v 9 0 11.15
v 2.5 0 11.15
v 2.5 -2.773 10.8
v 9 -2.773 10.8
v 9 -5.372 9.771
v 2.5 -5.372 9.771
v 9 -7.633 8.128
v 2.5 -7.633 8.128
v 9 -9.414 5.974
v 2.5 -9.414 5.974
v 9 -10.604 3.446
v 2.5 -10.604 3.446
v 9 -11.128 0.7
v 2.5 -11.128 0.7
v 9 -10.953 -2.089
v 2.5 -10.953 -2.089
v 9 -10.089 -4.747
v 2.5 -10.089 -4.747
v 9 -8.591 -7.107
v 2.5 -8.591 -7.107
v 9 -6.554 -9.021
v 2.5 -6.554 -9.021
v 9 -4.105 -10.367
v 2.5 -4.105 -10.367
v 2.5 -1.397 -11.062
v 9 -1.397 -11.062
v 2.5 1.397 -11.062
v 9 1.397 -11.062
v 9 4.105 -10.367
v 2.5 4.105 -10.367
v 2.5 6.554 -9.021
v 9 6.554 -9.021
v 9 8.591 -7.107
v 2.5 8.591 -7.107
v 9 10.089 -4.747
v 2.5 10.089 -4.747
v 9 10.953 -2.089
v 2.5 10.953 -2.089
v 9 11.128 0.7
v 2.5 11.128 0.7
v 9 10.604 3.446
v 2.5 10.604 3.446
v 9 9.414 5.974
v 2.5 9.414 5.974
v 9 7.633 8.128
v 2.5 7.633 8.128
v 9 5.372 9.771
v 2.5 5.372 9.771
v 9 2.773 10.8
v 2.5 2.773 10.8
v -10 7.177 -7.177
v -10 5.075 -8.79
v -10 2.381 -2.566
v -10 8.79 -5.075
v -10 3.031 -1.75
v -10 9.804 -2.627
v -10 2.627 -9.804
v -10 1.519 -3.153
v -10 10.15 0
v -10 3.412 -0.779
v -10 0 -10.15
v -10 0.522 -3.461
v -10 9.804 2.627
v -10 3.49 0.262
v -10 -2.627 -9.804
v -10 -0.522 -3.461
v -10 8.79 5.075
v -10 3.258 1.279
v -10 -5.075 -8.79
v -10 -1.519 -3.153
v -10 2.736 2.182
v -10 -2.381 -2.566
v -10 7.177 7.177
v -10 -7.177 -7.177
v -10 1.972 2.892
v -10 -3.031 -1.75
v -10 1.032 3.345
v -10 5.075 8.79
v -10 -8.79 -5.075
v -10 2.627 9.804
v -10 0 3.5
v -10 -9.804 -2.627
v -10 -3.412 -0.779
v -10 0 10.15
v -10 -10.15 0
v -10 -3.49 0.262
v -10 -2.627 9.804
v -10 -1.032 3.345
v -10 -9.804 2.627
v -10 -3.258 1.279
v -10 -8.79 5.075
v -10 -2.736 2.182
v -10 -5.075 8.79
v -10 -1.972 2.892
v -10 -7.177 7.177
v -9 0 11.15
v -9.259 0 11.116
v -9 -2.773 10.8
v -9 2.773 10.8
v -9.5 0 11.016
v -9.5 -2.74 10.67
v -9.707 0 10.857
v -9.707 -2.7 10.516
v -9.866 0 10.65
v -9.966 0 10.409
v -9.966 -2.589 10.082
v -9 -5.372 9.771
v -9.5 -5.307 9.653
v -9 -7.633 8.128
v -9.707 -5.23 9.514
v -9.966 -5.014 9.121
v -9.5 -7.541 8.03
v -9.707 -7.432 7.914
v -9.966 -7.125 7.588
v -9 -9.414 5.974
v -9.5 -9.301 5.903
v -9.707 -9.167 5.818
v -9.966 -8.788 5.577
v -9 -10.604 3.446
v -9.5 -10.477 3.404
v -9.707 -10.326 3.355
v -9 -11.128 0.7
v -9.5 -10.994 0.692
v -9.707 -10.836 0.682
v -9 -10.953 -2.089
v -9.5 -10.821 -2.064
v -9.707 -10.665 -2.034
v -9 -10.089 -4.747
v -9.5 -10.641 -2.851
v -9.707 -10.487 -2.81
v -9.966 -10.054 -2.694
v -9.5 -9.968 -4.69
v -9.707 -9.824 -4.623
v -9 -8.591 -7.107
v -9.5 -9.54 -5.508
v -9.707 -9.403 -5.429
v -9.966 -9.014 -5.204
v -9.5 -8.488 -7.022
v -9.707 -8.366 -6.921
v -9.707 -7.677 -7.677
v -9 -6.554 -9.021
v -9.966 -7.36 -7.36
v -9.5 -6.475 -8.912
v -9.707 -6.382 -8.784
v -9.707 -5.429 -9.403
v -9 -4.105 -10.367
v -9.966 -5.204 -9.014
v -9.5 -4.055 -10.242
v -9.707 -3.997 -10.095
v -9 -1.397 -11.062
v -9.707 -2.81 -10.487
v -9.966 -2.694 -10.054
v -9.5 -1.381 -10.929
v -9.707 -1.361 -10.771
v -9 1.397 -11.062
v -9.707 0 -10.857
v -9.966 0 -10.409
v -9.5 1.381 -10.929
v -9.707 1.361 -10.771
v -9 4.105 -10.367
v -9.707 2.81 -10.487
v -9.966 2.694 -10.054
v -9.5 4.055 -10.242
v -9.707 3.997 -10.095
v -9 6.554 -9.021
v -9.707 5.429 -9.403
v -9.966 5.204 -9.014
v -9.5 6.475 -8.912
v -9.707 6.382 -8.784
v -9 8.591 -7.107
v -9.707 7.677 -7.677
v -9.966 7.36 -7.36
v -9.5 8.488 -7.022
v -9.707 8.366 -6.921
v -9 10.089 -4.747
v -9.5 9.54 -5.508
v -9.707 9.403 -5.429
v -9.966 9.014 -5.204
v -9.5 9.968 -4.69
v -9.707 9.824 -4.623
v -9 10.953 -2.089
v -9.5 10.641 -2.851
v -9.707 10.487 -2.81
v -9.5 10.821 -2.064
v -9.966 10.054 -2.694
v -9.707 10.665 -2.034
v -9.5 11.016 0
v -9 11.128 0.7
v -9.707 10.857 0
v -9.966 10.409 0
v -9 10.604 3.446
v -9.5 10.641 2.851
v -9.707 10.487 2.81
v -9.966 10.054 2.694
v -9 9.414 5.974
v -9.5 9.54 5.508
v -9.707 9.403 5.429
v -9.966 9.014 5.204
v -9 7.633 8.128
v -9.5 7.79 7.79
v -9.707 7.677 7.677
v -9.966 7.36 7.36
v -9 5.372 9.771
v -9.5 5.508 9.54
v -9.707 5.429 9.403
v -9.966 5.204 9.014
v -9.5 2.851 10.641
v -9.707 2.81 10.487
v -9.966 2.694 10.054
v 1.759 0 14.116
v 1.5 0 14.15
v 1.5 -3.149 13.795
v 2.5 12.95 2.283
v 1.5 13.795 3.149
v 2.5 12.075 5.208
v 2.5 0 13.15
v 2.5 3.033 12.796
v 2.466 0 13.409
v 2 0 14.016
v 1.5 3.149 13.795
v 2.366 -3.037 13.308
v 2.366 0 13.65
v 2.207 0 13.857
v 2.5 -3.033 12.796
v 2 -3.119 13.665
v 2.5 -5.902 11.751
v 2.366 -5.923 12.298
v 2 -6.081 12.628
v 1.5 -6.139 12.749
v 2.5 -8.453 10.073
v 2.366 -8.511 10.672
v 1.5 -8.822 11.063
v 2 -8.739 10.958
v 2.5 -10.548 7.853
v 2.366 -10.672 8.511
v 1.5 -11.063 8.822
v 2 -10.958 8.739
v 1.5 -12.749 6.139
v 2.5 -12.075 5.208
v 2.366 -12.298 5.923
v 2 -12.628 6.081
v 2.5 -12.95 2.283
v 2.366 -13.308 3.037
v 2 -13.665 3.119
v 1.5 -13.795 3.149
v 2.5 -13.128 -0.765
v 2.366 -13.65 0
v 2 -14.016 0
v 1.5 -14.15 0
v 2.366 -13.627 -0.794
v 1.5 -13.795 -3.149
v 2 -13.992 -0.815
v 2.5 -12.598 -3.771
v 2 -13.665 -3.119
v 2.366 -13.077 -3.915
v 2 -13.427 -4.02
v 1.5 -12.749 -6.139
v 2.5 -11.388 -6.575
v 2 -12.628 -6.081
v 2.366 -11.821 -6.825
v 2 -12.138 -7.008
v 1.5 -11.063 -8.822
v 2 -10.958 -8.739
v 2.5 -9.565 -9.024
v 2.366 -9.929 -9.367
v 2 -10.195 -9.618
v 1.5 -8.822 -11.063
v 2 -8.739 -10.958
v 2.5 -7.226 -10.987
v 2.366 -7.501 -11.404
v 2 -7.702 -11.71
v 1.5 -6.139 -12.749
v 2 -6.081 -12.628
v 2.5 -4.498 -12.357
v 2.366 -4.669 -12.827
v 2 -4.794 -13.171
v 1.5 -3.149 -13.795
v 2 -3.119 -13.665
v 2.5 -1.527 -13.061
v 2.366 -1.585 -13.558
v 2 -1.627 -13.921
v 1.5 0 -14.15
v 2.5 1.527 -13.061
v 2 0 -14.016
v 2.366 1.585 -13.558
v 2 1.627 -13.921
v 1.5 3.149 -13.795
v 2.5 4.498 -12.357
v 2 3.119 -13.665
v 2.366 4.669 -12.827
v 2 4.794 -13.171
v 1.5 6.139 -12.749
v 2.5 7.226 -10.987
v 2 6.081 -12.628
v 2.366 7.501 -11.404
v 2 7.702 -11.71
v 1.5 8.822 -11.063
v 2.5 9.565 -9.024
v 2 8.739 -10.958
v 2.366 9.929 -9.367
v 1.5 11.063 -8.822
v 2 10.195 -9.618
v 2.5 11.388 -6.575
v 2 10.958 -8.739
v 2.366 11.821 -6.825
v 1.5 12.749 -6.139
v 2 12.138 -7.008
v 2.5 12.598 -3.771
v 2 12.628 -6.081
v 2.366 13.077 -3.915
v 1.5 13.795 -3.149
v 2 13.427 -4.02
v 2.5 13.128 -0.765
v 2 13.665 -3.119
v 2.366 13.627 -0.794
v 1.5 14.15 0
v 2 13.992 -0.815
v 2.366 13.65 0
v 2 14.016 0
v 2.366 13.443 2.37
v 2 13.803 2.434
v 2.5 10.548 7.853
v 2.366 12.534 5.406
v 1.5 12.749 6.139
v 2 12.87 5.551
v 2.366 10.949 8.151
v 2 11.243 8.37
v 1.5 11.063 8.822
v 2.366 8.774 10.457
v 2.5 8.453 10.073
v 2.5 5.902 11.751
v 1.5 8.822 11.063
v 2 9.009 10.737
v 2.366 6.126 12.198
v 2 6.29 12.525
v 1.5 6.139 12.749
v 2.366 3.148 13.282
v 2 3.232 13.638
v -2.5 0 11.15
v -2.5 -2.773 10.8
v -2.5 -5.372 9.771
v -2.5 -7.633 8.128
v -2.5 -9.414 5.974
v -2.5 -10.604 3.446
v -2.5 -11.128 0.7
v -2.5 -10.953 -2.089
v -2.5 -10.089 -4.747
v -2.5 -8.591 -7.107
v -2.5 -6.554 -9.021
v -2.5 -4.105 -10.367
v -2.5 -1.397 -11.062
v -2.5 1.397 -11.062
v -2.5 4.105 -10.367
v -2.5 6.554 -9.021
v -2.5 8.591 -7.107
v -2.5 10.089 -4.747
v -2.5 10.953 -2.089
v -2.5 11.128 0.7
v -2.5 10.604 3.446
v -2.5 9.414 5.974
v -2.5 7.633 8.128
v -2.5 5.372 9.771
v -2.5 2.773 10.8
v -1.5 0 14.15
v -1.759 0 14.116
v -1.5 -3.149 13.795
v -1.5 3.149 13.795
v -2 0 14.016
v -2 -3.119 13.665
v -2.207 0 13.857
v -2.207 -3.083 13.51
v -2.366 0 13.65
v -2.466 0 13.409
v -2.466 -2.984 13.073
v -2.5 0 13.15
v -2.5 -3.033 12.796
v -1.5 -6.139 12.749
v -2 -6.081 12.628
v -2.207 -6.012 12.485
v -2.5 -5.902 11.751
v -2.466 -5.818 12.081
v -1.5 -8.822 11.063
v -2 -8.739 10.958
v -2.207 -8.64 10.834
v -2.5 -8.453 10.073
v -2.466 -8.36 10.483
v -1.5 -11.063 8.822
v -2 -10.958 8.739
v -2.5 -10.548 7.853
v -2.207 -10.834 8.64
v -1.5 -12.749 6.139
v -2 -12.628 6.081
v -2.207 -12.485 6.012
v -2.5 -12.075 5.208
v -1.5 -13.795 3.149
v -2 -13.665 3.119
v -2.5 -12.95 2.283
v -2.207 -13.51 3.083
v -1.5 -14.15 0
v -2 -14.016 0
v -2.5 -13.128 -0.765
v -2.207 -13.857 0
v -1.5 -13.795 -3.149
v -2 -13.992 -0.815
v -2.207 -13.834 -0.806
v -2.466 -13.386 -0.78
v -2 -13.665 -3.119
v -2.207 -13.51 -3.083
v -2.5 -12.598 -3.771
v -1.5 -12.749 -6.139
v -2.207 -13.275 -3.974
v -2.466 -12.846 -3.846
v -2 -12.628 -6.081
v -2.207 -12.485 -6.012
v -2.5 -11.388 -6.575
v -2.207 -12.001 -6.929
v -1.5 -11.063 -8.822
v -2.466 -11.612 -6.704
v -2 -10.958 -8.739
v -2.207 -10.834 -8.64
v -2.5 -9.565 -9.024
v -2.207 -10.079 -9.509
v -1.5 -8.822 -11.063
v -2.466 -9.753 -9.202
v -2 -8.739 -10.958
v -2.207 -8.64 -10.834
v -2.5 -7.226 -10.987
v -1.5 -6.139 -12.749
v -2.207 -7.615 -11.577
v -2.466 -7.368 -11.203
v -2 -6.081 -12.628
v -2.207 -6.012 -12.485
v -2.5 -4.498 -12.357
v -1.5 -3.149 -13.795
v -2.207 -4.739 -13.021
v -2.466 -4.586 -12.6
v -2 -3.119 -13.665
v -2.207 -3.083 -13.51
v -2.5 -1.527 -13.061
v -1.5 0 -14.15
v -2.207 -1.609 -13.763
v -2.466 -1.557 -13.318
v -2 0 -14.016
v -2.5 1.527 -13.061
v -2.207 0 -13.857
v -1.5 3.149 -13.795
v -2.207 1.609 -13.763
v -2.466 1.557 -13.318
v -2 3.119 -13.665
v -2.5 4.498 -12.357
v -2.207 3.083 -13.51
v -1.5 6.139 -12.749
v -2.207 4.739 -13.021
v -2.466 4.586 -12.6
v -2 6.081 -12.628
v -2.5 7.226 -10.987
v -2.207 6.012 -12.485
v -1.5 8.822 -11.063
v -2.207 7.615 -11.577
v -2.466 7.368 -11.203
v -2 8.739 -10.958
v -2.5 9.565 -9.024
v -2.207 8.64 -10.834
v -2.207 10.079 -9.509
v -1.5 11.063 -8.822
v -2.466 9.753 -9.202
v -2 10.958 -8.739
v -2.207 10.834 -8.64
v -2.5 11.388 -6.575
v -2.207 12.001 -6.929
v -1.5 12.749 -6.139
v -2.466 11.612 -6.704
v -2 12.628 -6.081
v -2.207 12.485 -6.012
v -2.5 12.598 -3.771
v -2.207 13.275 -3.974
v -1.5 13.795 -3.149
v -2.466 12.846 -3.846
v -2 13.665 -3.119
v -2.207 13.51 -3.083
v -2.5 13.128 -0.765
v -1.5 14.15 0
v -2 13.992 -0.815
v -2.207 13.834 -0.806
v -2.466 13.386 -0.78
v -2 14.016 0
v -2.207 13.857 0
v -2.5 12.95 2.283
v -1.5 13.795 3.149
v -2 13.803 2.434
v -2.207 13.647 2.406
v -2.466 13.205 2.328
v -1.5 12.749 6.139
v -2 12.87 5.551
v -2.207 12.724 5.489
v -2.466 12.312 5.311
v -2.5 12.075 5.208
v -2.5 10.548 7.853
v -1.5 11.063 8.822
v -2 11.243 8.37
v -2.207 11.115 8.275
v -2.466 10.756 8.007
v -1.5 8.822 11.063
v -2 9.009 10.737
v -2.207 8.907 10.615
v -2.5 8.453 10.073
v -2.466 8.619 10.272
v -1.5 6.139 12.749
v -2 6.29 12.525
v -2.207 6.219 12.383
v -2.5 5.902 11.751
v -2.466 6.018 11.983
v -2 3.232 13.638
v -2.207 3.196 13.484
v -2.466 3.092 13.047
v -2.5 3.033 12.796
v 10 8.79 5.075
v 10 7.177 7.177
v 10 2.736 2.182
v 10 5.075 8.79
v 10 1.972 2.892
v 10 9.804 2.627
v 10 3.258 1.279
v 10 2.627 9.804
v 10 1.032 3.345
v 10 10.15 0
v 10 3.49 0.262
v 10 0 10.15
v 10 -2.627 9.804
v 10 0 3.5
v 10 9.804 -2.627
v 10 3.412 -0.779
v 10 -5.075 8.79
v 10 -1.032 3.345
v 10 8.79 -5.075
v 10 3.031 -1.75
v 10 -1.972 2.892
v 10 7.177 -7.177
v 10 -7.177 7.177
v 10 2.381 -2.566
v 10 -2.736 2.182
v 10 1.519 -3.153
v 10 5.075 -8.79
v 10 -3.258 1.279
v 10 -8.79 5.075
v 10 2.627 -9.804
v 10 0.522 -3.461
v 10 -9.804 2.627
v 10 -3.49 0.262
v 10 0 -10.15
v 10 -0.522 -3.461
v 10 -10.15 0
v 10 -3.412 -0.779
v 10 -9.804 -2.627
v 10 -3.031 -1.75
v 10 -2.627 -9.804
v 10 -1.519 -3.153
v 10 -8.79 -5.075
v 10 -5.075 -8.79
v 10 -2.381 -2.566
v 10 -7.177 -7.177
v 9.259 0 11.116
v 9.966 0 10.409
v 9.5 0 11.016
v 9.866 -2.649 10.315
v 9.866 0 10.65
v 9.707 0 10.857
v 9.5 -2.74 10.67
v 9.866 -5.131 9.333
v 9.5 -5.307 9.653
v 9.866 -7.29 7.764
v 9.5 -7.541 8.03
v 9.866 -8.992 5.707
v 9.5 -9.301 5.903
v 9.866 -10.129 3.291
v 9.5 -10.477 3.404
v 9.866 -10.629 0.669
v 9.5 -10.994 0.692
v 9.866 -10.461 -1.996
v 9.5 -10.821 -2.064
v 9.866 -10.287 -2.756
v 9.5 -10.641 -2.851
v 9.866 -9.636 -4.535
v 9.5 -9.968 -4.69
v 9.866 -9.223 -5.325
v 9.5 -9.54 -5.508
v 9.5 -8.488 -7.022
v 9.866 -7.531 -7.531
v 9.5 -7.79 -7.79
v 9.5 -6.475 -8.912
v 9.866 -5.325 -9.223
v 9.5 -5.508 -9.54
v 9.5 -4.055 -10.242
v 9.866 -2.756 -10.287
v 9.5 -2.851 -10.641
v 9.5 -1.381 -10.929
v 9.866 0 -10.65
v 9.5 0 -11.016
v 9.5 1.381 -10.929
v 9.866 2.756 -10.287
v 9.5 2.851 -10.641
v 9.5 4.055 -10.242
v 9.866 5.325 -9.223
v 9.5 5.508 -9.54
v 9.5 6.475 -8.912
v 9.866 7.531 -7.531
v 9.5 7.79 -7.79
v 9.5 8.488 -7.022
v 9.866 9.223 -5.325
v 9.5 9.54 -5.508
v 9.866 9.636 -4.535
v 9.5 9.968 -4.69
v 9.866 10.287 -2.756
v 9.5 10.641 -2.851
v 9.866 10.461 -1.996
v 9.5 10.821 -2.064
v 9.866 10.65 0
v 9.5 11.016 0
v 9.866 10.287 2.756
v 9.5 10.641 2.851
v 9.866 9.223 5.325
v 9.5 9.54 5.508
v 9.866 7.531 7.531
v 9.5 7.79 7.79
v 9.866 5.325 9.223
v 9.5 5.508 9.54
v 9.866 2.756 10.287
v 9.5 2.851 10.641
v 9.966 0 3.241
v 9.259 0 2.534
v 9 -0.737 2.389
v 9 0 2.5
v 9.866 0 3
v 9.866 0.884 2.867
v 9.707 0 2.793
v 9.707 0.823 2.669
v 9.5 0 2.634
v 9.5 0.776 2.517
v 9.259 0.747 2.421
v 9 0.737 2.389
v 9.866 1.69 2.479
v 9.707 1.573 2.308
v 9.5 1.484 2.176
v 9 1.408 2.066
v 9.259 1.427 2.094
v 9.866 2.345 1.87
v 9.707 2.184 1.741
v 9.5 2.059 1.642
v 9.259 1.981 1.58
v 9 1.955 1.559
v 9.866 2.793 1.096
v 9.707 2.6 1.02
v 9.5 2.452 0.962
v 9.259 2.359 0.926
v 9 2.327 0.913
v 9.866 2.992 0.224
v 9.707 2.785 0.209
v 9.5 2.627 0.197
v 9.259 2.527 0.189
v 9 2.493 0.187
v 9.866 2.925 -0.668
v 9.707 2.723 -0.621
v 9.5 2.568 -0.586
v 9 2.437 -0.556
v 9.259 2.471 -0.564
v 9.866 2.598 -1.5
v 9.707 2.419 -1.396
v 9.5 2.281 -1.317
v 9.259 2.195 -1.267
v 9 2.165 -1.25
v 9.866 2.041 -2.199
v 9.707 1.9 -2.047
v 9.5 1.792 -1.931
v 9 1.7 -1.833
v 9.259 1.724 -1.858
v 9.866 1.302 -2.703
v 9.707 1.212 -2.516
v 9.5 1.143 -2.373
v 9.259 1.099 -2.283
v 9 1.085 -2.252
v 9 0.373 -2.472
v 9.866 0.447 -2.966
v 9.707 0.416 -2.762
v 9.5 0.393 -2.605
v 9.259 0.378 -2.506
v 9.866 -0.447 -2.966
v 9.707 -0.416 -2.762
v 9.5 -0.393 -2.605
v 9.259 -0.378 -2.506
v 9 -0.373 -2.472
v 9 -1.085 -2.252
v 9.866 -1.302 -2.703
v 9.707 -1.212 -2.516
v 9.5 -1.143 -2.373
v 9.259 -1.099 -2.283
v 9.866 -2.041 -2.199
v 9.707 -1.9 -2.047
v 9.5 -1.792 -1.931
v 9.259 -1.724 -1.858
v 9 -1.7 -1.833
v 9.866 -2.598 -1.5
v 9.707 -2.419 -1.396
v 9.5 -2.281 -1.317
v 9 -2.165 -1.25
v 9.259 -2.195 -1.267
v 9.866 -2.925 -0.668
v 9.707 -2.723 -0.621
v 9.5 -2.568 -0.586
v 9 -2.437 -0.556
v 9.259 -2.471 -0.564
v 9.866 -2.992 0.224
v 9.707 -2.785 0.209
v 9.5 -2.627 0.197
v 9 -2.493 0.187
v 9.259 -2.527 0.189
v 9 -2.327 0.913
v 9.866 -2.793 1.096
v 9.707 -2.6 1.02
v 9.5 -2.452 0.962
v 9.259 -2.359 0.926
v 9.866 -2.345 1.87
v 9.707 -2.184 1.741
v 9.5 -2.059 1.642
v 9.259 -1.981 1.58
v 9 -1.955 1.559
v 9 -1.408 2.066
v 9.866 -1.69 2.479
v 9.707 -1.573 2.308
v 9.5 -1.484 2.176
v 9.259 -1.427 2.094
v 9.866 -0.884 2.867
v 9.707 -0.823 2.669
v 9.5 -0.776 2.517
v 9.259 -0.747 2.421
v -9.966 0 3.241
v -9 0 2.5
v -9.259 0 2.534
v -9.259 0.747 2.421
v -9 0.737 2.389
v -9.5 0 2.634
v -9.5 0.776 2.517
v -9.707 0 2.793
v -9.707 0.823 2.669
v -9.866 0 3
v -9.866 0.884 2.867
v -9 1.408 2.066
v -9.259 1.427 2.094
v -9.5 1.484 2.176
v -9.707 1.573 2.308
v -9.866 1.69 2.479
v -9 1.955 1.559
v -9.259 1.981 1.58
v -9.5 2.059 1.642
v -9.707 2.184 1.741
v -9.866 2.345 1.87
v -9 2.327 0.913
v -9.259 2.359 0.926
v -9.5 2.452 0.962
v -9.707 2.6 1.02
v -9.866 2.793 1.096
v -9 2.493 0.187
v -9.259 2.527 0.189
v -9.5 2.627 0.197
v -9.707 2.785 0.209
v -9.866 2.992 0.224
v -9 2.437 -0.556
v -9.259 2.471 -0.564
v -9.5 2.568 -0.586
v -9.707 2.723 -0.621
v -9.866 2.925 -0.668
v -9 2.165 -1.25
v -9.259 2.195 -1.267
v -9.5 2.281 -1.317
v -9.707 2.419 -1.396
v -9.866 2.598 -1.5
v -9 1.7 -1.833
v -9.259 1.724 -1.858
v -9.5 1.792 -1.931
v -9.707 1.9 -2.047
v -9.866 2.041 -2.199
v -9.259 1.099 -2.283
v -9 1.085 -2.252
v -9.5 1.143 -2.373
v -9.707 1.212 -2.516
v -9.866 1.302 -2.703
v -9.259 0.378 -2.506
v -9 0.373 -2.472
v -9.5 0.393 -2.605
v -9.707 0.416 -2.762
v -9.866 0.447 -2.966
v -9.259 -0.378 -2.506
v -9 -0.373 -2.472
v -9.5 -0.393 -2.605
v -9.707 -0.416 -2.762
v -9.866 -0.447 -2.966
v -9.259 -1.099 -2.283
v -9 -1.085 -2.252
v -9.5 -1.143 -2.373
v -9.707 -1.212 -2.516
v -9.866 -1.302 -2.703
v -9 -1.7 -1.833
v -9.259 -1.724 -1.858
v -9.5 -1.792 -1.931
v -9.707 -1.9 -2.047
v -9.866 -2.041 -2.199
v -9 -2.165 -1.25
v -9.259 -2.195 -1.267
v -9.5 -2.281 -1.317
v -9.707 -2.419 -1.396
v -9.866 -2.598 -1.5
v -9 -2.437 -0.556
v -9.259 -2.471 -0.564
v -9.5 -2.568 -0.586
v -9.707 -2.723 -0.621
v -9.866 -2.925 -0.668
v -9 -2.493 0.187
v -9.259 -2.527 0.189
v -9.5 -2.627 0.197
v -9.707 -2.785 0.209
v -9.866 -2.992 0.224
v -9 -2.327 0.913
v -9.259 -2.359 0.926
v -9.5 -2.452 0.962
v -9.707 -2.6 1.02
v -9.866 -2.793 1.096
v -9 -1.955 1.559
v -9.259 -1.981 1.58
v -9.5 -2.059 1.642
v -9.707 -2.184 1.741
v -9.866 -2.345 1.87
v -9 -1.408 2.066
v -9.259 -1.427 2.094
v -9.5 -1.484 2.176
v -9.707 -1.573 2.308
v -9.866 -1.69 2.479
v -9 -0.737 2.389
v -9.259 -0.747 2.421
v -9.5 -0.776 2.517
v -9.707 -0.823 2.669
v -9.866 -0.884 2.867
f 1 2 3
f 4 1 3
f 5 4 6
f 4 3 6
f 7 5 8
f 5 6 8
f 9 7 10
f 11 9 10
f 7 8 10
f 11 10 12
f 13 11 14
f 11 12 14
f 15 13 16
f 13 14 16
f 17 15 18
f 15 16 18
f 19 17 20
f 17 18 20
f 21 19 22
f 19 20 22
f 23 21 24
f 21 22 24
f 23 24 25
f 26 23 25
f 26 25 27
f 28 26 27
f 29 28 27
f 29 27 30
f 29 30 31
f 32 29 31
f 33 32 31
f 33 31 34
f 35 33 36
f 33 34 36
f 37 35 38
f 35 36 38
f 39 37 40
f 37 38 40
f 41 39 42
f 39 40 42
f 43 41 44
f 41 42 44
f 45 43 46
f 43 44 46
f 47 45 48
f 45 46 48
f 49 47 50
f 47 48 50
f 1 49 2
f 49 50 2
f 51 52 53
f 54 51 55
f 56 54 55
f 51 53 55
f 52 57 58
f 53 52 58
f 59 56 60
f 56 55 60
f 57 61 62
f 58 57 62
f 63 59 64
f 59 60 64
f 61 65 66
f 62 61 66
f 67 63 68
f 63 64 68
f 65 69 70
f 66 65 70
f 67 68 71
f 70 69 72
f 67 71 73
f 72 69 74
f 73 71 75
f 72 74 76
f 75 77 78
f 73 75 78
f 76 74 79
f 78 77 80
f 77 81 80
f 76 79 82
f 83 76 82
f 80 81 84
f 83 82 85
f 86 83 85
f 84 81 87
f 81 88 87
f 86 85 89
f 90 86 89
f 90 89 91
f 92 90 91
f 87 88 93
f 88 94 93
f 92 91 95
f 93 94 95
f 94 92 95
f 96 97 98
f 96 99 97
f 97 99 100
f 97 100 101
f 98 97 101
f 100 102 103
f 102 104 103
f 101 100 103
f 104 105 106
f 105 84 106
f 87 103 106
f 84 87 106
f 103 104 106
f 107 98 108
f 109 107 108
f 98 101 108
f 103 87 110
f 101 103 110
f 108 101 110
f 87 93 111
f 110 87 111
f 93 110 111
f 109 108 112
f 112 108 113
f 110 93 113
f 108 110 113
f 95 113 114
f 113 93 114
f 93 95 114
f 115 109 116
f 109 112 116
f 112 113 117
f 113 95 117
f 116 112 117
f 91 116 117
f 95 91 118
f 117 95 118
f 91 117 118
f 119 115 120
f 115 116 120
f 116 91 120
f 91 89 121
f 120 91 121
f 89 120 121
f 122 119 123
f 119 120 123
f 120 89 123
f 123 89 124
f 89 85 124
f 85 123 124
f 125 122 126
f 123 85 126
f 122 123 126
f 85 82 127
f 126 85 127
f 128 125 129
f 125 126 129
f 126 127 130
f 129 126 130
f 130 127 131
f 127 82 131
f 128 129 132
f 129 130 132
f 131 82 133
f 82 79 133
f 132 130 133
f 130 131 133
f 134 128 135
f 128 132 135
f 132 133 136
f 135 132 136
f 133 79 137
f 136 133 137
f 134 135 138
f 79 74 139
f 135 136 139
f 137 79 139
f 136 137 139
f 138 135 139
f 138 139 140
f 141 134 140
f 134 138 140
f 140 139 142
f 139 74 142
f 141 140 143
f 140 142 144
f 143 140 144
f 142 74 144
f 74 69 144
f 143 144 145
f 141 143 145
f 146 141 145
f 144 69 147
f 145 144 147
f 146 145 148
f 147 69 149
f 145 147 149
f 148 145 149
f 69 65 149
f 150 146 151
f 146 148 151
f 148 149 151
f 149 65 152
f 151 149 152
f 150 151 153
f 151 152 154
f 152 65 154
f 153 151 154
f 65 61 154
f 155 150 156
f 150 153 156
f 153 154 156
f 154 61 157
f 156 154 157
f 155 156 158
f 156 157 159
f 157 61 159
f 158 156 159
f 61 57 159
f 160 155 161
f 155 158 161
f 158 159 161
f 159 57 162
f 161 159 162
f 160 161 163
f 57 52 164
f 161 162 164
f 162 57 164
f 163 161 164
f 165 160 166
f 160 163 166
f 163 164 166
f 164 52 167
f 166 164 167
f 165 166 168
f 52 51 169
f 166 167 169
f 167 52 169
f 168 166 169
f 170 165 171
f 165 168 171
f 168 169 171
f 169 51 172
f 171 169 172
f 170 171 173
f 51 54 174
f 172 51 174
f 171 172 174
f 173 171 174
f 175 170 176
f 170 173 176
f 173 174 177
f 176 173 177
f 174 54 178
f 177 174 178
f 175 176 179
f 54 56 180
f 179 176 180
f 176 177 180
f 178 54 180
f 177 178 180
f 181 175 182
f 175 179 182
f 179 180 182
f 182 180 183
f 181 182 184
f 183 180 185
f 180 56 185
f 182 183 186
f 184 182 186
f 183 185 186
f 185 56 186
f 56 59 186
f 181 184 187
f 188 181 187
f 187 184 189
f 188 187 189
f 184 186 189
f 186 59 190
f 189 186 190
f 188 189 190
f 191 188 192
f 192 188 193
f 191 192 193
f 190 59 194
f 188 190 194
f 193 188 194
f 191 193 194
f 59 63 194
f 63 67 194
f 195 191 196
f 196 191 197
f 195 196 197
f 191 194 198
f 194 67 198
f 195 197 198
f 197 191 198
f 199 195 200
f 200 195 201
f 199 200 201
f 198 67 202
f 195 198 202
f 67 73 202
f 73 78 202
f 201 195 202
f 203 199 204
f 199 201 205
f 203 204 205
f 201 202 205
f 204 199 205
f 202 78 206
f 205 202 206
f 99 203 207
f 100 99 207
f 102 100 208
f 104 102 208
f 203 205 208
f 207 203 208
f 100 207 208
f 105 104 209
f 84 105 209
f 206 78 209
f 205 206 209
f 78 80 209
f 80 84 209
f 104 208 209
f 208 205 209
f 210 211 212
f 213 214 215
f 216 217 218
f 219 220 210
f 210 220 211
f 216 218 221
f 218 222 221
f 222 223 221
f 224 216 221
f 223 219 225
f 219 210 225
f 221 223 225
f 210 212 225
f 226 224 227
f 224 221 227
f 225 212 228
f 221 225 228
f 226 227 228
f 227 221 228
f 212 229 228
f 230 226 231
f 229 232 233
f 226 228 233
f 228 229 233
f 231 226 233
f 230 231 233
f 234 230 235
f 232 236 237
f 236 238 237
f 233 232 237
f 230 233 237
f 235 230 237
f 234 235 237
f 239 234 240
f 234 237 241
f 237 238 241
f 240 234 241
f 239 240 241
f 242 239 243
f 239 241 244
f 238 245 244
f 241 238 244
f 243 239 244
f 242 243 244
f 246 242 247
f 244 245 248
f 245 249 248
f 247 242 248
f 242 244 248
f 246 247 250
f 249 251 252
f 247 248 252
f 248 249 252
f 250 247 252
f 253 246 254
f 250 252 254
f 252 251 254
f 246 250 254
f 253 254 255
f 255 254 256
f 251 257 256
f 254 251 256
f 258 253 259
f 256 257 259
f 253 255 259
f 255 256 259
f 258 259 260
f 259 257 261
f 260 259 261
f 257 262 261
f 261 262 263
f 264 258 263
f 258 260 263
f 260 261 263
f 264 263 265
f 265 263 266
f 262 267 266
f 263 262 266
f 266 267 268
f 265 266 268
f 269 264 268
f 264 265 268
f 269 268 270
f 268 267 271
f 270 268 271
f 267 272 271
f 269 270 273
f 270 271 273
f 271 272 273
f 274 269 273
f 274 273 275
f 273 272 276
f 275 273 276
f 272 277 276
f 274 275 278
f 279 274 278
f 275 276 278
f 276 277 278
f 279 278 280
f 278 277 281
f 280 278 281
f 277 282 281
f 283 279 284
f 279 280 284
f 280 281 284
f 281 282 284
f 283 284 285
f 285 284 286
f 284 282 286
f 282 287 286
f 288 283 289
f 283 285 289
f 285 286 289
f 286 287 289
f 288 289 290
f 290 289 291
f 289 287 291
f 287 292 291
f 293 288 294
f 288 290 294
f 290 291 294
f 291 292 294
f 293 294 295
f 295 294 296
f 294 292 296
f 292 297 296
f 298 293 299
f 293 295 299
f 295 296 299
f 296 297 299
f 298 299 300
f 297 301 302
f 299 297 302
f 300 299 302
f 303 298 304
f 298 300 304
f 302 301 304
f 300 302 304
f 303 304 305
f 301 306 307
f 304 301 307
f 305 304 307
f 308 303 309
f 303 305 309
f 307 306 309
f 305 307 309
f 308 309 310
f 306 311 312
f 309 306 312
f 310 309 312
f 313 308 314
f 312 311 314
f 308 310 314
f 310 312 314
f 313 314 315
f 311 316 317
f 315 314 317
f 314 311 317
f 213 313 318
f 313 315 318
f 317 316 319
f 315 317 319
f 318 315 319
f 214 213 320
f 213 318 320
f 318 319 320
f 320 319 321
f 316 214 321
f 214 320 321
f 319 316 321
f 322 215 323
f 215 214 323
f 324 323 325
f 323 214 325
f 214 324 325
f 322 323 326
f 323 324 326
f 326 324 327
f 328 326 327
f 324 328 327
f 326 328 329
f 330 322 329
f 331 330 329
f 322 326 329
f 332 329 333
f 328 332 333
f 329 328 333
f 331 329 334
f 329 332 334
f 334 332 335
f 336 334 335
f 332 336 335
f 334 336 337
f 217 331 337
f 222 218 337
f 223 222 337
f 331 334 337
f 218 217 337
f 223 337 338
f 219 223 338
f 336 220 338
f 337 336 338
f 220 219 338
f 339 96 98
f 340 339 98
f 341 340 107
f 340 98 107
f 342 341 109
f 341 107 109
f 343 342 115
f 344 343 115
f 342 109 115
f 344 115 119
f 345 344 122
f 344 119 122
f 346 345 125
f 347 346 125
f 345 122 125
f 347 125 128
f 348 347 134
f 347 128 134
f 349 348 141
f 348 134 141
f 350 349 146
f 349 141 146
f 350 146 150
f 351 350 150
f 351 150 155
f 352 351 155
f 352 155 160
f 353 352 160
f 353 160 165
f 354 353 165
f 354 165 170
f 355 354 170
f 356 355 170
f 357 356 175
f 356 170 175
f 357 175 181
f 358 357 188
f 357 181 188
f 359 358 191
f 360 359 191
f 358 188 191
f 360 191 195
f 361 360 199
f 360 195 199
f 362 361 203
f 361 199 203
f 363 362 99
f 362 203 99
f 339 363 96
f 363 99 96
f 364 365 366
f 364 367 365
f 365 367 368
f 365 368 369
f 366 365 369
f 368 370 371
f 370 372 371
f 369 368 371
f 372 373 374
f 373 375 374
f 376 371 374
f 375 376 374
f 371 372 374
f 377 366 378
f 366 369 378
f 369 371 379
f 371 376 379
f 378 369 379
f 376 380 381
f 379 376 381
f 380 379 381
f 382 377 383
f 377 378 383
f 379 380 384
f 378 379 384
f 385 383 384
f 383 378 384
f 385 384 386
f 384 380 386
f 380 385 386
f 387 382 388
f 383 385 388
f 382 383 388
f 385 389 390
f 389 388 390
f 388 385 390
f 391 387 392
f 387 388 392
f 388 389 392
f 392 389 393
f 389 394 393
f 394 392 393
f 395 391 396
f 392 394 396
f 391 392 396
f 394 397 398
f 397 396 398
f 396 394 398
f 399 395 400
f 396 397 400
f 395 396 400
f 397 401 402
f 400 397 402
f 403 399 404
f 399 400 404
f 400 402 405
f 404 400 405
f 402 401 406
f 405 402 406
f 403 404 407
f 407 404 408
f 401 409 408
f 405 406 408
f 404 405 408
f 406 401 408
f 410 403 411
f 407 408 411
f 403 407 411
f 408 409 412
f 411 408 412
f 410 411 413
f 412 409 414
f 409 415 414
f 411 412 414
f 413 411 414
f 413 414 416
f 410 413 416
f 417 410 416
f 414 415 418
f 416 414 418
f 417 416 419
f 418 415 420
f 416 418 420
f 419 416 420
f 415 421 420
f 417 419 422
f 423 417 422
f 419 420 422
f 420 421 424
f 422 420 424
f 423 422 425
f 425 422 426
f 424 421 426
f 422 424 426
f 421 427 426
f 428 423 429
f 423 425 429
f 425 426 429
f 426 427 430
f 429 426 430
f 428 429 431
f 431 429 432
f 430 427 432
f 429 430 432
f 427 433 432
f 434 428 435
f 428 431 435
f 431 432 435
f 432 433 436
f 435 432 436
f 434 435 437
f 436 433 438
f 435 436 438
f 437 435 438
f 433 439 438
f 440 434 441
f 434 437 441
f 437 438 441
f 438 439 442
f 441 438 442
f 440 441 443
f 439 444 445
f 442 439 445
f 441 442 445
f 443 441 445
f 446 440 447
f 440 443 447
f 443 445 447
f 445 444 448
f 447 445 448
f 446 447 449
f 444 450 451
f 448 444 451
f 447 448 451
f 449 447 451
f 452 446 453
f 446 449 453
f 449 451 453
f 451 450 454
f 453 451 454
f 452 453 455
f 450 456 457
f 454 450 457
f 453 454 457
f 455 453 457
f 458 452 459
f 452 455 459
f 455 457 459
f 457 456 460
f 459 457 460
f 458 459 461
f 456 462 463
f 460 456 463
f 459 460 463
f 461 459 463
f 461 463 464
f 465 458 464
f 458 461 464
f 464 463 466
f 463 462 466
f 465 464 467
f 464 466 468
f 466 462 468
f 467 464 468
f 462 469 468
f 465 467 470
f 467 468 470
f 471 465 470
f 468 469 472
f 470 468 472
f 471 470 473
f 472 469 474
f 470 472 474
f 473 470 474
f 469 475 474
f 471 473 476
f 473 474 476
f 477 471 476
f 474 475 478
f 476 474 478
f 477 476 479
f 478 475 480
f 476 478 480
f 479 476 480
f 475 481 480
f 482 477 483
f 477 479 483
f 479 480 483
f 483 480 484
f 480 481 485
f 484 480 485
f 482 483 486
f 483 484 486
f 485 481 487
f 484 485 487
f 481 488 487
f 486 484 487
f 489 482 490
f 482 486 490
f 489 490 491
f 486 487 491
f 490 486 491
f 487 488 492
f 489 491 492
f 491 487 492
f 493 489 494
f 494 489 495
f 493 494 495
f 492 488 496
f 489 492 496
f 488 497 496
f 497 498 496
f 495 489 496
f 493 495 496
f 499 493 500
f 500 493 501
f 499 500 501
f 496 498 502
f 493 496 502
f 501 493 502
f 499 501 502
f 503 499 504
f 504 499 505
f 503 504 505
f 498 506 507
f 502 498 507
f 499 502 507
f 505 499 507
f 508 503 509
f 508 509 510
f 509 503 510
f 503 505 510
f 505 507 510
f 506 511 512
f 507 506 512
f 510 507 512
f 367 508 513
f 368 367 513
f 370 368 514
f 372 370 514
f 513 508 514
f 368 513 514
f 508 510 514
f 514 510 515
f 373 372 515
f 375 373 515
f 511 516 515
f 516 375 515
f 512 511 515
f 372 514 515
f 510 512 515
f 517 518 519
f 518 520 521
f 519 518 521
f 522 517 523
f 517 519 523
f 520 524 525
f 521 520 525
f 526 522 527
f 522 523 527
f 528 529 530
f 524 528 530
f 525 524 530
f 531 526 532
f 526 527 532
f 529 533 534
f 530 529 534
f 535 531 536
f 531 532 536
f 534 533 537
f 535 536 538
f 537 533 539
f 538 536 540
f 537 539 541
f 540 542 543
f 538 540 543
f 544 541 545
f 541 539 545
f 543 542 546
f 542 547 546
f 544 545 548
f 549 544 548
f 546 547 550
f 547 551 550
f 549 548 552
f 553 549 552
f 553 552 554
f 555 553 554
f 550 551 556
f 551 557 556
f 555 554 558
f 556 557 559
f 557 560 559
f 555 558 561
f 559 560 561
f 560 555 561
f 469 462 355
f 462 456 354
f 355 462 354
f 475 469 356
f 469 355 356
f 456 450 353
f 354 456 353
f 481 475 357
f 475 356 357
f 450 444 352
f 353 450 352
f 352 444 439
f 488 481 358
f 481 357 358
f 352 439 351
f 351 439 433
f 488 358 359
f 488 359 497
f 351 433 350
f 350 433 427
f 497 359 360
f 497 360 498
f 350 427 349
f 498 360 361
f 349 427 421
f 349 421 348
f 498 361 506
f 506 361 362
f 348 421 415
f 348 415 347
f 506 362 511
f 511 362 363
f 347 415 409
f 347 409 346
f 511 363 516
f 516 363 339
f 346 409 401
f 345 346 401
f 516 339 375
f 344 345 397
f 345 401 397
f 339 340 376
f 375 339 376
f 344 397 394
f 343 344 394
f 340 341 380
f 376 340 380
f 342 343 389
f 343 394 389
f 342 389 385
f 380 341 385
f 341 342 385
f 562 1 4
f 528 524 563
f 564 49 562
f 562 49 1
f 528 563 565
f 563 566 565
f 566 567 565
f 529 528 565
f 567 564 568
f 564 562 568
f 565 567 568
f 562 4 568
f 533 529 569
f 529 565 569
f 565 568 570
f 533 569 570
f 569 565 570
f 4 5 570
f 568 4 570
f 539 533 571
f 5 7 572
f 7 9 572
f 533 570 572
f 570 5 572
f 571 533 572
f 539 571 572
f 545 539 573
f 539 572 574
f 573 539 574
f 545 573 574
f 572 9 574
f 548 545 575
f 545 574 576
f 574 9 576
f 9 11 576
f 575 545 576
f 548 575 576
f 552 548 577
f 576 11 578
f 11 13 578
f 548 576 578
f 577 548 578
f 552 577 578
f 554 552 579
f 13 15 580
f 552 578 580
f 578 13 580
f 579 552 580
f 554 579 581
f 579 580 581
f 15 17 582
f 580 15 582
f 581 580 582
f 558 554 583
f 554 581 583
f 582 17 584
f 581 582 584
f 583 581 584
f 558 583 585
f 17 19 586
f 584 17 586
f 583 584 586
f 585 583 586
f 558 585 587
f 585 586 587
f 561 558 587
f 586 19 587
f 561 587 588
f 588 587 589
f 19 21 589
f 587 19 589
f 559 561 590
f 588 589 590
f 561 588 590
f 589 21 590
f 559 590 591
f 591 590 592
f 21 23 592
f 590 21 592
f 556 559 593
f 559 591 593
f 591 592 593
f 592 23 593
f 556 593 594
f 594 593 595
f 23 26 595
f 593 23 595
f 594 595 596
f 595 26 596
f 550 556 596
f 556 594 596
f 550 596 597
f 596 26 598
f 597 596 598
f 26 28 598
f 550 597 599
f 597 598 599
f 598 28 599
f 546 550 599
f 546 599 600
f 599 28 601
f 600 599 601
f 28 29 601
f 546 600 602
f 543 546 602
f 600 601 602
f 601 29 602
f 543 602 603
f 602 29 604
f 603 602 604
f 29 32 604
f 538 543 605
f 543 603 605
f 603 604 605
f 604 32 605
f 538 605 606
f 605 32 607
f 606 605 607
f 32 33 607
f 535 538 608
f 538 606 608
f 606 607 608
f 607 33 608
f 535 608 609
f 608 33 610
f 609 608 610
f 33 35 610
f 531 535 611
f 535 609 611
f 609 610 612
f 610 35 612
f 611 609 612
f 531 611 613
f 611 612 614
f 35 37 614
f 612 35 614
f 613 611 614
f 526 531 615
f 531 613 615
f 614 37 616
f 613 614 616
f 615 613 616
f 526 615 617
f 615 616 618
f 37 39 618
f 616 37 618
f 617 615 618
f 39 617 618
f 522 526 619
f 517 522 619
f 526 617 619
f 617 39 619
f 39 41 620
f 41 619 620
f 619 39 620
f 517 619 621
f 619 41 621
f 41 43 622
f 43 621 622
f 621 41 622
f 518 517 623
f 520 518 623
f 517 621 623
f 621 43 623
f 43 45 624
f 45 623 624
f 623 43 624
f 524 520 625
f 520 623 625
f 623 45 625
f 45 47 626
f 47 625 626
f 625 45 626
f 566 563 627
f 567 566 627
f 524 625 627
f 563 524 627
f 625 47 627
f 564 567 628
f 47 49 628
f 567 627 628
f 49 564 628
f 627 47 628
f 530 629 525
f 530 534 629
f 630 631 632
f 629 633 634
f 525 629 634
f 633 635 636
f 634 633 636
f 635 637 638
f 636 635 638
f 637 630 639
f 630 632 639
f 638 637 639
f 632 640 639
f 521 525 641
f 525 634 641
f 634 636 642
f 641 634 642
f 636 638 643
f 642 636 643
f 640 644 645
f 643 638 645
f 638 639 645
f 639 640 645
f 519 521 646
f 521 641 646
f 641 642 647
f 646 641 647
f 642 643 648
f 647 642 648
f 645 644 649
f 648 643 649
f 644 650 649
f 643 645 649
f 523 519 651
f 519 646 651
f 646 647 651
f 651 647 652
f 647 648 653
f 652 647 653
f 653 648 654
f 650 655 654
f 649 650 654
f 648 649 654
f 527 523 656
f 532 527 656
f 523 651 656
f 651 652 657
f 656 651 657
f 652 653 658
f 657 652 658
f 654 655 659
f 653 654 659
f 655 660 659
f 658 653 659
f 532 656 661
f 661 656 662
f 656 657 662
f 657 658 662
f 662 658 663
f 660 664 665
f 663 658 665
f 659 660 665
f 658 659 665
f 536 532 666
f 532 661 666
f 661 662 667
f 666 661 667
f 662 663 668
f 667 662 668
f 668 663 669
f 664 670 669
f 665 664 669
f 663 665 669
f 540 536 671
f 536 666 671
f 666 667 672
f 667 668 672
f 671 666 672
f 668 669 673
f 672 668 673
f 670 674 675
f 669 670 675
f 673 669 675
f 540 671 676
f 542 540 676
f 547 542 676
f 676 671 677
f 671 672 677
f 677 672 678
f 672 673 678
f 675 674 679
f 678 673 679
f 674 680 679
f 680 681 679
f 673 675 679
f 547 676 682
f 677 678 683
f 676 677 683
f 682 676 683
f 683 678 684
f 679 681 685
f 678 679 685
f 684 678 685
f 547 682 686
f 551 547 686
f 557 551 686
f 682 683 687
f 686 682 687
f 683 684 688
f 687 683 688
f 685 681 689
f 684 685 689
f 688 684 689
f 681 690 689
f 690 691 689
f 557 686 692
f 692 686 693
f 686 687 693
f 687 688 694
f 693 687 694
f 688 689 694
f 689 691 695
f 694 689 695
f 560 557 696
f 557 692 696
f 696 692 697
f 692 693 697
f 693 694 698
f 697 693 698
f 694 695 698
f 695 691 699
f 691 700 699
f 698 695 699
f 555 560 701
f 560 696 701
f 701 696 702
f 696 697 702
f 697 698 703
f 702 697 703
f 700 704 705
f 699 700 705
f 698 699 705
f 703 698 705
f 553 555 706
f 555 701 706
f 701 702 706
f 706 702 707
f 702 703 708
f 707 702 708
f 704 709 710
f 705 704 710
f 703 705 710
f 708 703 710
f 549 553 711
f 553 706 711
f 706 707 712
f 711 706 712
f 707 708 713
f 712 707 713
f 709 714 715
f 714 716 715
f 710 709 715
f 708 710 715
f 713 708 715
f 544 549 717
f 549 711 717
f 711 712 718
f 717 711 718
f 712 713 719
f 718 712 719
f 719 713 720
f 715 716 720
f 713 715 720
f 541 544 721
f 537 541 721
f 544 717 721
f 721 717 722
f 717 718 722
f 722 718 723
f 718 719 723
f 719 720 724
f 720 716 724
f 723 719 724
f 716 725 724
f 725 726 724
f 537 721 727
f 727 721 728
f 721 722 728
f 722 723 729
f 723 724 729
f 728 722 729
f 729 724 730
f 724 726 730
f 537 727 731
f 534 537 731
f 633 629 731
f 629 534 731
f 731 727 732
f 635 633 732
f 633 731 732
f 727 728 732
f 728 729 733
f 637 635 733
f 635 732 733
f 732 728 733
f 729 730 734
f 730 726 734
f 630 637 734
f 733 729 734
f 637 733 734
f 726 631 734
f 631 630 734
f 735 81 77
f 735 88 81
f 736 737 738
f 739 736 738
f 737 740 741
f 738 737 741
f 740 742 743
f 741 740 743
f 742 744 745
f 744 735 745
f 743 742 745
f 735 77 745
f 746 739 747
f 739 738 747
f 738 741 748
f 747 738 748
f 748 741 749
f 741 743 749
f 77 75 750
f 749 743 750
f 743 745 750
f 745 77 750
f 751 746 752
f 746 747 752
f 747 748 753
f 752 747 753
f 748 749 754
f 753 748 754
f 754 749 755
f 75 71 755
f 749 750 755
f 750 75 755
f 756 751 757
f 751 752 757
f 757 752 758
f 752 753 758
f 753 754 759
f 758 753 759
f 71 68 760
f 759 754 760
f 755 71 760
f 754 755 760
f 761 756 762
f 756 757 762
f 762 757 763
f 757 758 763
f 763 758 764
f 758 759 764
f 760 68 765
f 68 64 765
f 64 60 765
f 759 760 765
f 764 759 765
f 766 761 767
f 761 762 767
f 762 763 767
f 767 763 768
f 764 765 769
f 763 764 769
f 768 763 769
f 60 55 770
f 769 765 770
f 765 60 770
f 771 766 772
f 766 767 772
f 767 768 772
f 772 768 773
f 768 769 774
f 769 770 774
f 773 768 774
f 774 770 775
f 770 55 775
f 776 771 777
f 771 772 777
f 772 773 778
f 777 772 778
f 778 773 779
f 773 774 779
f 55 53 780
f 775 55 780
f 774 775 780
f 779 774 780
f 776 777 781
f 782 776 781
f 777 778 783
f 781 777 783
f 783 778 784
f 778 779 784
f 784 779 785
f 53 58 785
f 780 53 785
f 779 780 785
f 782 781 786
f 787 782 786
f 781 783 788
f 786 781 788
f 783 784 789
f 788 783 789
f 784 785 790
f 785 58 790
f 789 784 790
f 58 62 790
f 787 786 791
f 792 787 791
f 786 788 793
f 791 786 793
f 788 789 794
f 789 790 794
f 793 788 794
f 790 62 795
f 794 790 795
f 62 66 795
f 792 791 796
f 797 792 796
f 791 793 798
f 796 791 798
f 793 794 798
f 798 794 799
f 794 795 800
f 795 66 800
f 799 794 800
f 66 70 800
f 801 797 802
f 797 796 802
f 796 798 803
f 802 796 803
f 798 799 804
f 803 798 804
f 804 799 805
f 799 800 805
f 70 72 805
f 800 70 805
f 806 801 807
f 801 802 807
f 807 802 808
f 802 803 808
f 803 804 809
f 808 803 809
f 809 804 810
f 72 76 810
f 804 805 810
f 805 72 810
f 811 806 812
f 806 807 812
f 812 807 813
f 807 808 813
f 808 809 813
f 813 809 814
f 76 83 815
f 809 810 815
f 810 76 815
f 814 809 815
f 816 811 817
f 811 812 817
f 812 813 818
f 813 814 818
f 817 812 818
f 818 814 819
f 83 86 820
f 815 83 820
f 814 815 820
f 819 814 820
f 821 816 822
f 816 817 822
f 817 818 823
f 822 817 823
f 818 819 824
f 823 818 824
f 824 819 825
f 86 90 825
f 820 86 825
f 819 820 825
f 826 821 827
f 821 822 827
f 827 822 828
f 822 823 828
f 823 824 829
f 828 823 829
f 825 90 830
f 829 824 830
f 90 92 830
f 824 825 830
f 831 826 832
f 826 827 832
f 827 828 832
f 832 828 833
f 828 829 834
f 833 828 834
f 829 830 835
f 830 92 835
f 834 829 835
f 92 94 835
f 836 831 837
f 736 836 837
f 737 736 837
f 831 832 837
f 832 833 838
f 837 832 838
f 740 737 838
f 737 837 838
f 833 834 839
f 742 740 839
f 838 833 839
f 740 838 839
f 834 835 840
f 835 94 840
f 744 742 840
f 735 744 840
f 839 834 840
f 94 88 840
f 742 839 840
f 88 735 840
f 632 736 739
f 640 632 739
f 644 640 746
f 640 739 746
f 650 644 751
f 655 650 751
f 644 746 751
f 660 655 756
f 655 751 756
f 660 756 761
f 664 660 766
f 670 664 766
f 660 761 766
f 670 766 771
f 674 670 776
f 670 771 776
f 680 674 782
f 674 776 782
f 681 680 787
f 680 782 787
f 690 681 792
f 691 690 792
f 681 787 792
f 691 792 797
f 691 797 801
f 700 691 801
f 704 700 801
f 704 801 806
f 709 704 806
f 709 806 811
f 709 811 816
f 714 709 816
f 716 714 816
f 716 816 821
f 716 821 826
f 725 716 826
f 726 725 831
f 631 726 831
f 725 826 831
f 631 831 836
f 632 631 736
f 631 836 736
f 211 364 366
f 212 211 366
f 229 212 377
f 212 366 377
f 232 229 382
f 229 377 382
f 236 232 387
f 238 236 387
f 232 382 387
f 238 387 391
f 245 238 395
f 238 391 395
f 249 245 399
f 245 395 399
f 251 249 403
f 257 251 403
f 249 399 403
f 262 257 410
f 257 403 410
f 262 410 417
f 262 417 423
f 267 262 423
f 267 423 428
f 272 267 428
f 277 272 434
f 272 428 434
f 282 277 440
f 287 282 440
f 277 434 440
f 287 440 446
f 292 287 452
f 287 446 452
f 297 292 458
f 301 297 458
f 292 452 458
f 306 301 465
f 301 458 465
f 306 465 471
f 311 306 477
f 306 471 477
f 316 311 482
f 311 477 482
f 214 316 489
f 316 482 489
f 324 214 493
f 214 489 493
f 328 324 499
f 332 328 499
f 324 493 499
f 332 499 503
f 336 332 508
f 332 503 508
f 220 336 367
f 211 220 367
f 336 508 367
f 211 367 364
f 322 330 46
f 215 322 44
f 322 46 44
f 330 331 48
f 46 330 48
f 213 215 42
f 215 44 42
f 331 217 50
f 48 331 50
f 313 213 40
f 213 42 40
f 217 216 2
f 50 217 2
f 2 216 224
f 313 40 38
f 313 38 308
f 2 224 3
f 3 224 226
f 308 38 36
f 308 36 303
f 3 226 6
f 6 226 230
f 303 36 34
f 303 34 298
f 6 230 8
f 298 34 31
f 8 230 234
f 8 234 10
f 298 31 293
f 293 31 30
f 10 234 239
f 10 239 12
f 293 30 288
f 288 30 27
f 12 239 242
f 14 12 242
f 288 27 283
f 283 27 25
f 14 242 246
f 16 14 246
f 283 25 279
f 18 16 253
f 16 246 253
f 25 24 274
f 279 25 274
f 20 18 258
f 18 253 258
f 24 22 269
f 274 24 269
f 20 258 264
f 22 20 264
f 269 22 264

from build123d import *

# Parameters (mm, degrees)
CONG_1_R                = 1
ESQUISSE7_R             = 2.5
ENL_V_MAT_EXTRU_3_DEPTH = 20
CONG_2_R                = 1


with BuildPart() as part:
    # Esquisse1 → Révolution1 (revolve)
    with BuildSketch(Plane.XY, mode=Mode.PRIVATE) as r_volution1_sk:
        Polygon((-10, 0), (10, 0), (10, 11.15), (2.5, 11.15), (2.5, 14.15), (-2.5, 14.15), (-2.5, 11.15), (-10, 11.15), align=None)
    revolve(r_volution1_sk.sketch.rotate(Axis((-10, 0, 0), (1, 0, 0)), 90), axis=Axis((-10, 0, 0), (1, 0, 0)))

    # Congé1
    cong_1_edges = [part.edges().sort_by_distance(p)[0] for p in [
        (-10, 0, -11.15),
        (-2.5, 0, -14.15),
        (2.5, 0, -14.15),
        (10, 0, -11.15),
    ]]
    fillet(cong_1_edges, radius=CONG_1_R)

    # Esquisse7 → Enlèv. mat.-Extru.3 (cut)
    with BuildSketch(Plane.ZY.offset(10)):
        Circle(ESQUISSE7_R)
    extrude(amount=-ENL_V_MAT_EXTRU_3_DEPTH, mode=Mode.SUBTRACT)

    # Congé2
    cong_2_edges = [part.edges().sort_by_distance(p)[0] for p in [
        (10, 0, -2.5),
        (-10, 0, -2.5),
    ]]
    fillet(cong_2_edges, radius=CONG_2_R)


solid = part.part
